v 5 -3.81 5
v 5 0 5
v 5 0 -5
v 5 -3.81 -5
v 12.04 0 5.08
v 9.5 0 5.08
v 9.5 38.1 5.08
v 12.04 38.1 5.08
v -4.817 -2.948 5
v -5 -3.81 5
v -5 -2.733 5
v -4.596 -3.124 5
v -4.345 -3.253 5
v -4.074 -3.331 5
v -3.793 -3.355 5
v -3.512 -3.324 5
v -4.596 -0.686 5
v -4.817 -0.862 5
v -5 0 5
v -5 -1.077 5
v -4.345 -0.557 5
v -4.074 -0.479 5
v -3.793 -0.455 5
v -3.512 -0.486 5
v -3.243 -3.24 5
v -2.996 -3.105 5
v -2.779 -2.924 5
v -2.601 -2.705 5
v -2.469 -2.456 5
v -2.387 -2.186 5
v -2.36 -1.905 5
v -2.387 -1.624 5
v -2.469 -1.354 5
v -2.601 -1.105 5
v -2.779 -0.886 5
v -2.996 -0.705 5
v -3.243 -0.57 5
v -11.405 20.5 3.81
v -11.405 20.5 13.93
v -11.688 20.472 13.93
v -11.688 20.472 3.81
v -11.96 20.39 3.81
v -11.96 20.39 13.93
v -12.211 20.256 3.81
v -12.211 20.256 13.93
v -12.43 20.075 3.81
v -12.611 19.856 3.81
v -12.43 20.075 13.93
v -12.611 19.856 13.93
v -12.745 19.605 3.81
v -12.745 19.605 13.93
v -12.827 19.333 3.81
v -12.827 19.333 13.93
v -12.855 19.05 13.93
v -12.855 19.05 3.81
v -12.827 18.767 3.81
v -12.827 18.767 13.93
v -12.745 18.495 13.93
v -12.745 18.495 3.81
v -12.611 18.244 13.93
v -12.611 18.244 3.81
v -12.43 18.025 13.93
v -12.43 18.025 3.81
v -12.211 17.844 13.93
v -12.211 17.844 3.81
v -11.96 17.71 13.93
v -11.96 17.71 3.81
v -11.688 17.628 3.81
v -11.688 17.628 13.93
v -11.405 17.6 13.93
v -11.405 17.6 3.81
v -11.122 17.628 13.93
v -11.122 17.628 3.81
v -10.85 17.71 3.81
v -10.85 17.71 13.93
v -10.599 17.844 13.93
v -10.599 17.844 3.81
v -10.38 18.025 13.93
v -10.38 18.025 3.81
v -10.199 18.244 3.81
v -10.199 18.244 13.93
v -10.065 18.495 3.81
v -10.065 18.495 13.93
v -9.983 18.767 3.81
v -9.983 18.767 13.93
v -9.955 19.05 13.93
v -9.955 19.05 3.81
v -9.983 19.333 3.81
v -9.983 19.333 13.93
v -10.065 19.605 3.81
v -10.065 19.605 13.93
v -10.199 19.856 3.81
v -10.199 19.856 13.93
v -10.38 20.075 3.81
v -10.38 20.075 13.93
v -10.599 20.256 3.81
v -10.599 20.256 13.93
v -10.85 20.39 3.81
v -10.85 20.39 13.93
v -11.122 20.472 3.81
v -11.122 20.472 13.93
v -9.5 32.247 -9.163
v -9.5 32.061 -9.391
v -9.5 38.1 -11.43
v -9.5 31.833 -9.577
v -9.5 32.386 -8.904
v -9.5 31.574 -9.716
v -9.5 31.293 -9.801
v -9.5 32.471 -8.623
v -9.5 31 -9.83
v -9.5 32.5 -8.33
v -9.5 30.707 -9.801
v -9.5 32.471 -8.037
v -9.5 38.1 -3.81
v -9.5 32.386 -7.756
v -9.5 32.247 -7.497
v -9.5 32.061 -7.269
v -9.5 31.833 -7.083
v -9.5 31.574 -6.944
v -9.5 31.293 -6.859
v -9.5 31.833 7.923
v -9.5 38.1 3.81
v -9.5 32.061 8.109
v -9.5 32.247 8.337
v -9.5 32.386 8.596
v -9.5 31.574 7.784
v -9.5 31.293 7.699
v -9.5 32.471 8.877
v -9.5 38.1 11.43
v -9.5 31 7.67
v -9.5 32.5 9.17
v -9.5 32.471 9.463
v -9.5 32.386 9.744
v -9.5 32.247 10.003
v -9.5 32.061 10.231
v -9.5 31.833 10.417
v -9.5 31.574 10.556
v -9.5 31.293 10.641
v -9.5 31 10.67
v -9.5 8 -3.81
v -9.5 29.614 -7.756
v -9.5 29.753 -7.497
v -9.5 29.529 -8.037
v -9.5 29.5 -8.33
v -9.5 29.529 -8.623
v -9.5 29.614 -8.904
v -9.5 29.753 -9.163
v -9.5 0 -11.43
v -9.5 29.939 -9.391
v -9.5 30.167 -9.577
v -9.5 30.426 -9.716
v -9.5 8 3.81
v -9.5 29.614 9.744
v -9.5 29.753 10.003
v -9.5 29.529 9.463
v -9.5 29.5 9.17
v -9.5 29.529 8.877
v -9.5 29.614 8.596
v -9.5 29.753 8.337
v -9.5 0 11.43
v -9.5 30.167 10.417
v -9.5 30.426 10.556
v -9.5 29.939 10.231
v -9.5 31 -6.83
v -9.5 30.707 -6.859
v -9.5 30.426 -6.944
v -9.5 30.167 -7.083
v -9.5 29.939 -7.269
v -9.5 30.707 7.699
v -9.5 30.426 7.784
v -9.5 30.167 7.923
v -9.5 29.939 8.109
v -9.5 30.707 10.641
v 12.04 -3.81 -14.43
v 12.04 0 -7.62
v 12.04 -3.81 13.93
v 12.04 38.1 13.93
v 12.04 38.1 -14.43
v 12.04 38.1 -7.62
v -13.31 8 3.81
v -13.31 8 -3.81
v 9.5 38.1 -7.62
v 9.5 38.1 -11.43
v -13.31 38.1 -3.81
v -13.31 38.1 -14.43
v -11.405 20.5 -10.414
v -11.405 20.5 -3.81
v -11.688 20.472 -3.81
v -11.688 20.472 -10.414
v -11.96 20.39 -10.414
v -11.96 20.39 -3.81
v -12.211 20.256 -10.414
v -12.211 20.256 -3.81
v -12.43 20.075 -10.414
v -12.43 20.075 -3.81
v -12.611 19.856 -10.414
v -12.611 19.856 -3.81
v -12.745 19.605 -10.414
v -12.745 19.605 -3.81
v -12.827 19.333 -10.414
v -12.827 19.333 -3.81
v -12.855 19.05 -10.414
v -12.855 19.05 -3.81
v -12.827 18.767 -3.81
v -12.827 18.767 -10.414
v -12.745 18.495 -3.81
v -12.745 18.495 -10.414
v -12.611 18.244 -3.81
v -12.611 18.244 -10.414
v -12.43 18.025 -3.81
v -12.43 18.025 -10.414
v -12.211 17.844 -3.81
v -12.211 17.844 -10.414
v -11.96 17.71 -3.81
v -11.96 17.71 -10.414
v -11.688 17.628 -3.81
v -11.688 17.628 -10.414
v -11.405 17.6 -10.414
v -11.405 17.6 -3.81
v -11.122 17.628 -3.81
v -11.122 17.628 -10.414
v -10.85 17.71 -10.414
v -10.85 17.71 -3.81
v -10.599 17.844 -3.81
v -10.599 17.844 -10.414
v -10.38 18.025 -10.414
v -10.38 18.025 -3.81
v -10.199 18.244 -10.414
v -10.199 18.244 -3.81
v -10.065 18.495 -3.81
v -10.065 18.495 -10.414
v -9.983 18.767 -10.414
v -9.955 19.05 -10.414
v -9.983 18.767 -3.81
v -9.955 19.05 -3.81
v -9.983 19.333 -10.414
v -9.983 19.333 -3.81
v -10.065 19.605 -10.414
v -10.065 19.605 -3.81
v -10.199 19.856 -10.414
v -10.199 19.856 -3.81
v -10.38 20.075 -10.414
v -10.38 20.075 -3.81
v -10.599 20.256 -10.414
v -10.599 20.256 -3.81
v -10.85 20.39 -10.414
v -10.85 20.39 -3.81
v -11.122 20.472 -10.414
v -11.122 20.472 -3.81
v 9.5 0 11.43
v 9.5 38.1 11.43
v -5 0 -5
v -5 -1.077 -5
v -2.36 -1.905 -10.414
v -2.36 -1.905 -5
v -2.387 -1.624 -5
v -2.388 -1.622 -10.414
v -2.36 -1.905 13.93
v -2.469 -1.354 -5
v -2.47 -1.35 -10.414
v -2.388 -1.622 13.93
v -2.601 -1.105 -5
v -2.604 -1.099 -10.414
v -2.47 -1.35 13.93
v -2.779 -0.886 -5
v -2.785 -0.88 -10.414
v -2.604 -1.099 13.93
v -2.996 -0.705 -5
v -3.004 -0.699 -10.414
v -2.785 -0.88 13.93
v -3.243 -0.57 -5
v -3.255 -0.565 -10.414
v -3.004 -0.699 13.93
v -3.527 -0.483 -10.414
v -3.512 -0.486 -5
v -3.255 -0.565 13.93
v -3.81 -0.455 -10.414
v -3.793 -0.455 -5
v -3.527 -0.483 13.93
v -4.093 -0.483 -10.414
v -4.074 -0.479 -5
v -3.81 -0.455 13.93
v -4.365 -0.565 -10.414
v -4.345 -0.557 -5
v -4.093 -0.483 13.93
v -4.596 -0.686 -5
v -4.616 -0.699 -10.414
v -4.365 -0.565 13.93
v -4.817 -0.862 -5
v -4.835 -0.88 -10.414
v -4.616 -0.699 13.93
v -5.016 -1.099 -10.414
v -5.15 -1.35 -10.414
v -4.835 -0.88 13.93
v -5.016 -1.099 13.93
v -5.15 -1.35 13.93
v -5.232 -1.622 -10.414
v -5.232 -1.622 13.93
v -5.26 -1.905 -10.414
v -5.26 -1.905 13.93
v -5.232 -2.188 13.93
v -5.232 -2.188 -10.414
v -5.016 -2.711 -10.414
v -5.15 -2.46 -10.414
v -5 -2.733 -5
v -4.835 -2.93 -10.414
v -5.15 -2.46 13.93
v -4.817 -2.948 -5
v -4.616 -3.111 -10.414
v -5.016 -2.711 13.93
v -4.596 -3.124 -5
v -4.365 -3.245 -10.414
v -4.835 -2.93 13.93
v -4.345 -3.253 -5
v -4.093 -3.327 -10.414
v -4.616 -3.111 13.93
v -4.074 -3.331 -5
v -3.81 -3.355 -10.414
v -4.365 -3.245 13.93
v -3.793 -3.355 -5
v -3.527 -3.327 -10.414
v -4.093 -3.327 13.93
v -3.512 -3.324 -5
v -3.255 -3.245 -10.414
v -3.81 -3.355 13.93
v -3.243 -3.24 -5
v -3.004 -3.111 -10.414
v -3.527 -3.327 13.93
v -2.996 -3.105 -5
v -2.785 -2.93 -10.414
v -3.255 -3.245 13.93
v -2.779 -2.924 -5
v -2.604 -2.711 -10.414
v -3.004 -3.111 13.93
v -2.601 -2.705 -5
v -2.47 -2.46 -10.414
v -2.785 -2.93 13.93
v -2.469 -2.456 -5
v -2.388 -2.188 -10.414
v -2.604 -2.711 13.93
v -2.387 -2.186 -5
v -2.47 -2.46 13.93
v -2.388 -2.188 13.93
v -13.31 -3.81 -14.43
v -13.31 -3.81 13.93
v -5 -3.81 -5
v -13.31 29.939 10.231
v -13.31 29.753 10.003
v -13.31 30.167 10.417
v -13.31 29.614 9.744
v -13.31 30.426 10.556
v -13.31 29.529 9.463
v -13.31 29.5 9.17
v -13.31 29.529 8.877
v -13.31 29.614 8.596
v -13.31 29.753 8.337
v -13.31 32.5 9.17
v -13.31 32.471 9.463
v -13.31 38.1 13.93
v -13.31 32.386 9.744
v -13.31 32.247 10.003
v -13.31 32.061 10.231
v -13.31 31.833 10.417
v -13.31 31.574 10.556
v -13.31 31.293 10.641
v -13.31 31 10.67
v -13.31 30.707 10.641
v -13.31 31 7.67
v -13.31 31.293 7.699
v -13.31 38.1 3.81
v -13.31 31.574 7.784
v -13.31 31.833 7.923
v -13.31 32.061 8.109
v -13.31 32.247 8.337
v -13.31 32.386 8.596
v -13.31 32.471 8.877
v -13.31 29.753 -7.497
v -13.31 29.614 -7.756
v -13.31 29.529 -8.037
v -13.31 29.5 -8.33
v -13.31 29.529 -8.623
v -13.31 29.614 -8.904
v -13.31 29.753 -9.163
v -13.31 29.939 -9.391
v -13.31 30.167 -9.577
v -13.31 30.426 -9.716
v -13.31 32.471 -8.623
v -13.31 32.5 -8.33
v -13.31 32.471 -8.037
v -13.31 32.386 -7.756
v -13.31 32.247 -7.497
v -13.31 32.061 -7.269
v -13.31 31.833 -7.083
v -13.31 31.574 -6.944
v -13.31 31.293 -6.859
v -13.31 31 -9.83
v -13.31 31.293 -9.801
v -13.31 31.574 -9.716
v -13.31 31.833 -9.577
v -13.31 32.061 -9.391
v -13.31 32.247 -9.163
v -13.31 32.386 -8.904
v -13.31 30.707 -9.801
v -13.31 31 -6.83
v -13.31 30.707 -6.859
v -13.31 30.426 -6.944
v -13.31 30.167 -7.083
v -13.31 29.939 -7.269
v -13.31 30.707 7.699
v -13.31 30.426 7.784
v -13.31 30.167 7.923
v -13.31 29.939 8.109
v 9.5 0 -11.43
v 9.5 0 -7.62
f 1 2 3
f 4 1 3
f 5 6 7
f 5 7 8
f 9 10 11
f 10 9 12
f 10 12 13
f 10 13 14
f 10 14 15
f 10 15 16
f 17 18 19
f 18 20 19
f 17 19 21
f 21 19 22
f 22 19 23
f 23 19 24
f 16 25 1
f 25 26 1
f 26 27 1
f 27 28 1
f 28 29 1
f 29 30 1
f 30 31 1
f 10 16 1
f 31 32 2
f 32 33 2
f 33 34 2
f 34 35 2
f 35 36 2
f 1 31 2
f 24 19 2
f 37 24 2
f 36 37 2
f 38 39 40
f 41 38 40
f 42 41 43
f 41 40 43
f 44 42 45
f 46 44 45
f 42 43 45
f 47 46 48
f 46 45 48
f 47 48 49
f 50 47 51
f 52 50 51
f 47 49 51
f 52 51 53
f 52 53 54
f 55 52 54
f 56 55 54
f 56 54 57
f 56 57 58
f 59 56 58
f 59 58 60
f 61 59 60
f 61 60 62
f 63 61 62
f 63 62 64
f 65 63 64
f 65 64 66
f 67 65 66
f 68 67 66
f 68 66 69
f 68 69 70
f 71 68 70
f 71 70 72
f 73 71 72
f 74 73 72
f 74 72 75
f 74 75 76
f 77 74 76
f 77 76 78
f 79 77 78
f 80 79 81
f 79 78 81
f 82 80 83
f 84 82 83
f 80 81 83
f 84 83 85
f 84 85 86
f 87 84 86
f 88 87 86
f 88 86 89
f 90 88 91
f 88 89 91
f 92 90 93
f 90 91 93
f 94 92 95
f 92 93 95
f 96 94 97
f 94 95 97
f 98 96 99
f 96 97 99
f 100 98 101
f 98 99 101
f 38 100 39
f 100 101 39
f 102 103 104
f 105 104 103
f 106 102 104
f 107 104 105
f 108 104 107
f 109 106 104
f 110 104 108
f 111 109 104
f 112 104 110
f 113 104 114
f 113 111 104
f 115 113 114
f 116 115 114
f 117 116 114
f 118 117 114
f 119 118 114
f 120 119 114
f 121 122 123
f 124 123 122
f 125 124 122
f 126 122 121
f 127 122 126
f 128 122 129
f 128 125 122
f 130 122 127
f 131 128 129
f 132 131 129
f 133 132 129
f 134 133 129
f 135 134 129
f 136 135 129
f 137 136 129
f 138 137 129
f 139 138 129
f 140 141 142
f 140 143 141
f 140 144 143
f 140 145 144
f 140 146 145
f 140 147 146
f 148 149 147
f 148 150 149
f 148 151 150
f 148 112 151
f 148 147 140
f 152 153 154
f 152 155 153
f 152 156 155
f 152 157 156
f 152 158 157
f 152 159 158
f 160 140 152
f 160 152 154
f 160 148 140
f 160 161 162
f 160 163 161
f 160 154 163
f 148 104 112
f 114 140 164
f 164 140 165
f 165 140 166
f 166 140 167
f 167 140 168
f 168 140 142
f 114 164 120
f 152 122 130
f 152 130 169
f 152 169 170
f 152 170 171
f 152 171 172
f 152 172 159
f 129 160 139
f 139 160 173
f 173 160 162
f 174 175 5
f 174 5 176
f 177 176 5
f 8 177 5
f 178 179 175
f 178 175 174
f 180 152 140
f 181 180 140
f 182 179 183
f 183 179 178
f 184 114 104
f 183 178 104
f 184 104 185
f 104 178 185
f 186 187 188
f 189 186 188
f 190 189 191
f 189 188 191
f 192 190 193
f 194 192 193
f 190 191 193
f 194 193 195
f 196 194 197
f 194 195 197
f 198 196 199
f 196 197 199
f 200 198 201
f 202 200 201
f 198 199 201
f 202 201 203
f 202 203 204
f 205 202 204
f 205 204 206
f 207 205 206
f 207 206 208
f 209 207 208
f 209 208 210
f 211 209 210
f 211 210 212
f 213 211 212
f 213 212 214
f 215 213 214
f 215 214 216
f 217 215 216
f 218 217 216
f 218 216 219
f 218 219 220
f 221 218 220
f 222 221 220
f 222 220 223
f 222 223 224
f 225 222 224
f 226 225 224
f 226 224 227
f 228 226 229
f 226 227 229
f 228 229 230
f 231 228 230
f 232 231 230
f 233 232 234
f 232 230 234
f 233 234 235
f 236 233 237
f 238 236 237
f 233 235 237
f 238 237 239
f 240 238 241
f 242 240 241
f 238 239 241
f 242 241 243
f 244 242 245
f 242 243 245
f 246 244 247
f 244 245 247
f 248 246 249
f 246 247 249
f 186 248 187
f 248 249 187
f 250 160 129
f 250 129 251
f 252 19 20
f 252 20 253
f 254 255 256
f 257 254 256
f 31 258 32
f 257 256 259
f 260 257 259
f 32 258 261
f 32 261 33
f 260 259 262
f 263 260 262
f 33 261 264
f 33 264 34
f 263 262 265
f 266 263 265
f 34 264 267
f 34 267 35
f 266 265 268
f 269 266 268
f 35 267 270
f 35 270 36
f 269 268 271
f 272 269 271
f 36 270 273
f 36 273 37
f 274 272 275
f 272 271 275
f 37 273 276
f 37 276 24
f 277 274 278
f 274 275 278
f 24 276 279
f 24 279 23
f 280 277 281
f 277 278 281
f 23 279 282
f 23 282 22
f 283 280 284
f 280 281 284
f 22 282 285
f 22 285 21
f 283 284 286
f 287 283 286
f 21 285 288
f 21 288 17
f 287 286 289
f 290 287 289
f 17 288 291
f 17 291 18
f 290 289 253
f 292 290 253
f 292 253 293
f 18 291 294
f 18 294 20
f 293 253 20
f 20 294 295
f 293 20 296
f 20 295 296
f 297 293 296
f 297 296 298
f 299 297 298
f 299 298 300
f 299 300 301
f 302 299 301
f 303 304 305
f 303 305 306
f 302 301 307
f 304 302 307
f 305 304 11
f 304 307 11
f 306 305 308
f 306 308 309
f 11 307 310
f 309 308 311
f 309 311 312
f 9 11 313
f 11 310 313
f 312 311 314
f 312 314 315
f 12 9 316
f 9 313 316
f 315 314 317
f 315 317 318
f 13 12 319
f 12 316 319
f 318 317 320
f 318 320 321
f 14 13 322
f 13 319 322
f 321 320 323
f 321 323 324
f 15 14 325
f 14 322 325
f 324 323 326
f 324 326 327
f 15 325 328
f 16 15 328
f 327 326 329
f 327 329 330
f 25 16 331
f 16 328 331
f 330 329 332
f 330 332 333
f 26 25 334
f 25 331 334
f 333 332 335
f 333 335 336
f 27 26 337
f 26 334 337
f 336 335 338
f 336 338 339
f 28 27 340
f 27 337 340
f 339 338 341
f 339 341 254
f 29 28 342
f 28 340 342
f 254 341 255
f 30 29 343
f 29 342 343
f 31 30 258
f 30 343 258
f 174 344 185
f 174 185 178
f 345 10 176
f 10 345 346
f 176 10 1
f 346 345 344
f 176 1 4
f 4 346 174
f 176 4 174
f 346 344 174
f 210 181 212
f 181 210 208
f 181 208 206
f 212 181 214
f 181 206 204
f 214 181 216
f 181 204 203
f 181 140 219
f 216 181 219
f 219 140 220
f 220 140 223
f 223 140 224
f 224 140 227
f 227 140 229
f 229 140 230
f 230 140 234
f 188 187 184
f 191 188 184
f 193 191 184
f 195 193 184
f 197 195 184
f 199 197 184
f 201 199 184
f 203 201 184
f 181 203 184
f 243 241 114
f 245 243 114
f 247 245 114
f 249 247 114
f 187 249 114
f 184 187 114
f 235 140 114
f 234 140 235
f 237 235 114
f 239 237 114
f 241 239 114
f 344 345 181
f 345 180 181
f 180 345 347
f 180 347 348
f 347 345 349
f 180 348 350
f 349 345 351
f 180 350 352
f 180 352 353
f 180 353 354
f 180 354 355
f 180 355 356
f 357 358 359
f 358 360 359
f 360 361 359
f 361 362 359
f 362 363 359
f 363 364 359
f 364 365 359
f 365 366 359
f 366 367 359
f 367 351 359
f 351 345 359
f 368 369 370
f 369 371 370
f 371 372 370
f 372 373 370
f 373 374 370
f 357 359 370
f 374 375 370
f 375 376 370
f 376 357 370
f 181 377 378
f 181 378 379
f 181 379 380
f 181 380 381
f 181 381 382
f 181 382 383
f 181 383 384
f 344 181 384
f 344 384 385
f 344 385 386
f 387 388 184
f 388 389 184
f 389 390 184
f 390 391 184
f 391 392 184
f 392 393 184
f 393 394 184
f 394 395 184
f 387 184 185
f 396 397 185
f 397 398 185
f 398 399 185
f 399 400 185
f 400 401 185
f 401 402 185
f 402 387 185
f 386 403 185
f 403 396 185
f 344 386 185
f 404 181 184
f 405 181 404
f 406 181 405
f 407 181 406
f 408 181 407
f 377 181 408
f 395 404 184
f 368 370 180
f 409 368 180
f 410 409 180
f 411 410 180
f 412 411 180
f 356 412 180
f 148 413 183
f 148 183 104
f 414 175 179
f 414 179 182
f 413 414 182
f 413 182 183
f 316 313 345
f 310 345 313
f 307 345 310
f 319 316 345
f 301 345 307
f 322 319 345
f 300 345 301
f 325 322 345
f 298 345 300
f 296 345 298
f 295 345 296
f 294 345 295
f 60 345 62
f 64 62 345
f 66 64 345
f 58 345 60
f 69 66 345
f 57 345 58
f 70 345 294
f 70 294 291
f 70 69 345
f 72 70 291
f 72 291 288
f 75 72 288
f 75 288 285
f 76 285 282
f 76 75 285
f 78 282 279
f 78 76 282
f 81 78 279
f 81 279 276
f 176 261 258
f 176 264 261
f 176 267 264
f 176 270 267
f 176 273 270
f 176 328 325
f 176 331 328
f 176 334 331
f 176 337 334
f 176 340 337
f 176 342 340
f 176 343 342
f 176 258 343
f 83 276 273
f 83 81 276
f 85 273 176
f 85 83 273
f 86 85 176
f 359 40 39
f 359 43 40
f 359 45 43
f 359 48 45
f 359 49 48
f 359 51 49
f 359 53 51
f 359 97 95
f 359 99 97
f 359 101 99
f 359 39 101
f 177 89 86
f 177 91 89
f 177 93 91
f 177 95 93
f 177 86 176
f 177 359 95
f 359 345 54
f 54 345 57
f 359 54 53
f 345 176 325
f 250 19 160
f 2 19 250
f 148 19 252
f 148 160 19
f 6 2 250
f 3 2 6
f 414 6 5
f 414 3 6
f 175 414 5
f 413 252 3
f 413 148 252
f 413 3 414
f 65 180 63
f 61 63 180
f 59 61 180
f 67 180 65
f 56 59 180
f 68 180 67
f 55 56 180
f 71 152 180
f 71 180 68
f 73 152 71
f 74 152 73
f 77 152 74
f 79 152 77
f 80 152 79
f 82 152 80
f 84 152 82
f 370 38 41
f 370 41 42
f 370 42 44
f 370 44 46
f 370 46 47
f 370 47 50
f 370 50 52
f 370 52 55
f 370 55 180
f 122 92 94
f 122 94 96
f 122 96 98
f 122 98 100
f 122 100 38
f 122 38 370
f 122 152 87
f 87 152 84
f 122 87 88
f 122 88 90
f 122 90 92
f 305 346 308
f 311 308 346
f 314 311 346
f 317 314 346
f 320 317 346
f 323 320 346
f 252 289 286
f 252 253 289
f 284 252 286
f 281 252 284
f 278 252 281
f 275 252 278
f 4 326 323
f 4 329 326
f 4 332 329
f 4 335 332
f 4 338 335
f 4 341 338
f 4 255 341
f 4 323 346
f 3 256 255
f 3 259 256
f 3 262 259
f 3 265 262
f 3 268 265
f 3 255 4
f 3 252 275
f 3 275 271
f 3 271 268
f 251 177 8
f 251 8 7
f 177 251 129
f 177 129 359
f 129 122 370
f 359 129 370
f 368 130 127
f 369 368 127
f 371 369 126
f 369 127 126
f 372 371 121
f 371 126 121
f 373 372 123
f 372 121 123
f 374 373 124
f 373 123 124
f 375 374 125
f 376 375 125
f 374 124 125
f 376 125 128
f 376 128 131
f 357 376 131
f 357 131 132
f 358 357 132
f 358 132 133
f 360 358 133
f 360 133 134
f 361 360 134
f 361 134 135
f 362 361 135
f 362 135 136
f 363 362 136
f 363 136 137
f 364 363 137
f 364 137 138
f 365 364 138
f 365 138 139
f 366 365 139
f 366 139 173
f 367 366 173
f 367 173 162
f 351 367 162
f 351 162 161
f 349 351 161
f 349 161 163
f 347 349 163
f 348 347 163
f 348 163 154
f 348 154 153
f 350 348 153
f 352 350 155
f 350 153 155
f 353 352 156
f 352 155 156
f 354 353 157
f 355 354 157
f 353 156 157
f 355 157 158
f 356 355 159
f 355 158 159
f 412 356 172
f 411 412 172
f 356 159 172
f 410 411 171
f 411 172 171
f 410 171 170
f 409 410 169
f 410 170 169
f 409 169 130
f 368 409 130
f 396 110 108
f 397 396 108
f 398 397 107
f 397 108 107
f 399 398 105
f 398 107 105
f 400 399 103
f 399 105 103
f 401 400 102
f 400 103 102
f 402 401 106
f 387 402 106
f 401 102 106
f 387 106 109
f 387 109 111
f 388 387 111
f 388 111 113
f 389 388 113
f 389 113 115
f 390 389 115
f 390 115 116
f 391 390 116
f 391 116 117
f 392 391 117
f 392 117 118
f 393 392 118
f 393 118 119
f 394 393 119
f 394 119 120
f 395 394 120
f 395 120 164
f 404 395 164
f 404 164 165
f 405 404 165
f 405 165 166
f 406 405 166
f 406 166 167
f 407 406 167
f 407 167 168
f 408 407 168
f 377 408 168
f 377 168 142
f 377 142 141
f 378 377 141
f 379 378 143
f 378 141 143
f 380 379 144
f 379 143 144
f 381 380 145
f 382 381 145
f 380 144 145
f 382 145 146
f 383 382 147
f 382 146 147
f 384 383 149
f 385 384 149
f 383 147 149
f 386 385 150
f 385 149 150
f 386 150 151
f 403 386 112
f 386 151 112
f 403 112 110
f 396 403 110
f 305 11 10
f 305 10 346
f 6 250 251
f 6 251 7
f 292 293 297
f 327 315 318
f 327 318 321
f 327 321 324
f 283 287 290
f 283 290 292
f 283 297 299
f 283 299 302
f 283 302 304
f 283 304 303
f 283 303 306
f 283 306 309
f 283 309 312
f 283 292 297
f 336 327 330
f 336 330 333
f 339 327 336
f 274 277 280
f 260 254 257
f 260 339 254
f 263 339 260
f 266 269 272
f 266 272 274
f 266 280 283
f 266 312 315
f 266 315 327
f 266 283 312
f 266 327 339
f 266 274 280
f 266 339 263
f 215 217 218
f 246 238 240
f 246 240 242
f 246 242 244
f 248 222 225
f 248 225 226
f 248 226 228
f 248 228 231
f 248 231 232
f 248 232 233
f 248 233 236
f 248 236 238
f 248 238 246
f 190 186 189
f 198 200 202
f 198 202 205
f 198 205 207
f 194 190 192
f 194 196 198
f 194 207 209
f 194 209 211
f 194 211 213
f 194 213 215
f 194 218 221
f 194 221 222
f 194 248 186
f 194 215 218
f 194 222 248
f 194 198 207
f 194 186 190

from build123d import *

# Parameters (mm, degrees)
BOSS_EXTRUDE2_DEPTH = 38.1
SKETCH1_W           = 25.35
SKETCH1_H           = 28.36
BOSS_EXTRUDE3_DEPTH = 3.81
SKETCH3_W           = 10
SKETCH3_H           = 10
CUT_EXTRUDE1_DEPTH  = 43.860132991
SKETCH4_W           = 7.62
SKETCH4_H           = 30.1
CUT_EXTRUDE2_DEPTH  = 47.084775143
SKETCH5_R           = 1.5
CUT_EXTRUDE3_DEPTH  = 47.084775143
SKETCH6_R           = 1.45
CUT_EXTRUDE4_DEPTH  = 24.344


with BuildPart() as part:
    # Sketch2 → Boss-Extrude2 (new body)
    with BuildSketch(Plane(origin=(0, 0, 0), x_dir=(1, 0, 0), z_dir=(0, 1, 0))):
        Polygon((-9.5, -11.43), (9.5, -11.43), (9.5, -5.08), (12.04, -5.08), (12.04, -13.93), (-13.31, -13.93), (-13.31, 14.43), (12.04, 14.43), (12.04, 7.62), (9.5, 7.62), (9.5, 11.43), (-9.5, 11.43), align=None)
    extrude(amount=BOSS_EXTRUDE2_DEPTH)

    # Sketch1 → Boss-Extrude3 (add)
    with BuildSketch(Plane(origin=(0, 0, 0), x_dir=(1, 0, 0), z_dir=(0, 1, 0))):
        with Locations((-0.635, 0.25)):
            Rectangle(SKETCH1_W, SKETCH1_H)
    extrude(amount=-BOSS_EXTRUDE3_DEPTH)

    # Sketch3 → Cut-Extrude1 (cut, through all)
    with BuildSketch(Plane(origin=(0, 0, 0), x_dir=(1, 0, 0), z_dir=(0, 1, 0))):
        Rectangle(SKETCH3_W, SKETCH3_H)
    extrude(amount=-CUT_EXTRUDE1_DEPTH, mode=Mode.SUBTRACT)

    # Sketch4 → Cut-Extrude2 (cut, through all)
    with BuildSketch(Plane(origin=(-9.5, 0, 0), x_dir=(0, 0, -1), z_dir=(1, 0, 0))):
        with Locations((0, 23.05)):
            Rectangle(SKETCH4_W, SKETCH4_H)
    extrude(amount=-CUT_EXTRUDE2_DEPTH, mode=Mode.SUBTRACT)

    # Sketch5 → Cut-Extrude3 (cut, through all)
    with BuildSketch(Plane(origin=(-9.5, 0, 0), x_dir=(0, 0, -1), z_dir=(1, 0, 0))):
        with Locations((-9.1700096, 31)):
            Circle(SKETCH5_R)
        with Locations((8.3299904, 31)):
            Circle(SKETCH5_R)
    extrude(amount=-CUT_EXTRUDE3_DEPTH, mode=Mode.SUBTRACT)

    # Sketch6 → Cut-Extrude4 (cut)
    with BuildSketch(Plane.XY.offset(13.93)):
        with Locations(Location((-11.405, 19.05, 0), (0, 0, 90))):
            Circle(SKETCH6_R)
        with Locations((-3.81, -1.905)):
            Circle(SKETCH6_R)
    extrude(amount=-CUT_EXTRUDE4_DEPTH, mode=Mode.SUBTRACT)


solid = part.part
